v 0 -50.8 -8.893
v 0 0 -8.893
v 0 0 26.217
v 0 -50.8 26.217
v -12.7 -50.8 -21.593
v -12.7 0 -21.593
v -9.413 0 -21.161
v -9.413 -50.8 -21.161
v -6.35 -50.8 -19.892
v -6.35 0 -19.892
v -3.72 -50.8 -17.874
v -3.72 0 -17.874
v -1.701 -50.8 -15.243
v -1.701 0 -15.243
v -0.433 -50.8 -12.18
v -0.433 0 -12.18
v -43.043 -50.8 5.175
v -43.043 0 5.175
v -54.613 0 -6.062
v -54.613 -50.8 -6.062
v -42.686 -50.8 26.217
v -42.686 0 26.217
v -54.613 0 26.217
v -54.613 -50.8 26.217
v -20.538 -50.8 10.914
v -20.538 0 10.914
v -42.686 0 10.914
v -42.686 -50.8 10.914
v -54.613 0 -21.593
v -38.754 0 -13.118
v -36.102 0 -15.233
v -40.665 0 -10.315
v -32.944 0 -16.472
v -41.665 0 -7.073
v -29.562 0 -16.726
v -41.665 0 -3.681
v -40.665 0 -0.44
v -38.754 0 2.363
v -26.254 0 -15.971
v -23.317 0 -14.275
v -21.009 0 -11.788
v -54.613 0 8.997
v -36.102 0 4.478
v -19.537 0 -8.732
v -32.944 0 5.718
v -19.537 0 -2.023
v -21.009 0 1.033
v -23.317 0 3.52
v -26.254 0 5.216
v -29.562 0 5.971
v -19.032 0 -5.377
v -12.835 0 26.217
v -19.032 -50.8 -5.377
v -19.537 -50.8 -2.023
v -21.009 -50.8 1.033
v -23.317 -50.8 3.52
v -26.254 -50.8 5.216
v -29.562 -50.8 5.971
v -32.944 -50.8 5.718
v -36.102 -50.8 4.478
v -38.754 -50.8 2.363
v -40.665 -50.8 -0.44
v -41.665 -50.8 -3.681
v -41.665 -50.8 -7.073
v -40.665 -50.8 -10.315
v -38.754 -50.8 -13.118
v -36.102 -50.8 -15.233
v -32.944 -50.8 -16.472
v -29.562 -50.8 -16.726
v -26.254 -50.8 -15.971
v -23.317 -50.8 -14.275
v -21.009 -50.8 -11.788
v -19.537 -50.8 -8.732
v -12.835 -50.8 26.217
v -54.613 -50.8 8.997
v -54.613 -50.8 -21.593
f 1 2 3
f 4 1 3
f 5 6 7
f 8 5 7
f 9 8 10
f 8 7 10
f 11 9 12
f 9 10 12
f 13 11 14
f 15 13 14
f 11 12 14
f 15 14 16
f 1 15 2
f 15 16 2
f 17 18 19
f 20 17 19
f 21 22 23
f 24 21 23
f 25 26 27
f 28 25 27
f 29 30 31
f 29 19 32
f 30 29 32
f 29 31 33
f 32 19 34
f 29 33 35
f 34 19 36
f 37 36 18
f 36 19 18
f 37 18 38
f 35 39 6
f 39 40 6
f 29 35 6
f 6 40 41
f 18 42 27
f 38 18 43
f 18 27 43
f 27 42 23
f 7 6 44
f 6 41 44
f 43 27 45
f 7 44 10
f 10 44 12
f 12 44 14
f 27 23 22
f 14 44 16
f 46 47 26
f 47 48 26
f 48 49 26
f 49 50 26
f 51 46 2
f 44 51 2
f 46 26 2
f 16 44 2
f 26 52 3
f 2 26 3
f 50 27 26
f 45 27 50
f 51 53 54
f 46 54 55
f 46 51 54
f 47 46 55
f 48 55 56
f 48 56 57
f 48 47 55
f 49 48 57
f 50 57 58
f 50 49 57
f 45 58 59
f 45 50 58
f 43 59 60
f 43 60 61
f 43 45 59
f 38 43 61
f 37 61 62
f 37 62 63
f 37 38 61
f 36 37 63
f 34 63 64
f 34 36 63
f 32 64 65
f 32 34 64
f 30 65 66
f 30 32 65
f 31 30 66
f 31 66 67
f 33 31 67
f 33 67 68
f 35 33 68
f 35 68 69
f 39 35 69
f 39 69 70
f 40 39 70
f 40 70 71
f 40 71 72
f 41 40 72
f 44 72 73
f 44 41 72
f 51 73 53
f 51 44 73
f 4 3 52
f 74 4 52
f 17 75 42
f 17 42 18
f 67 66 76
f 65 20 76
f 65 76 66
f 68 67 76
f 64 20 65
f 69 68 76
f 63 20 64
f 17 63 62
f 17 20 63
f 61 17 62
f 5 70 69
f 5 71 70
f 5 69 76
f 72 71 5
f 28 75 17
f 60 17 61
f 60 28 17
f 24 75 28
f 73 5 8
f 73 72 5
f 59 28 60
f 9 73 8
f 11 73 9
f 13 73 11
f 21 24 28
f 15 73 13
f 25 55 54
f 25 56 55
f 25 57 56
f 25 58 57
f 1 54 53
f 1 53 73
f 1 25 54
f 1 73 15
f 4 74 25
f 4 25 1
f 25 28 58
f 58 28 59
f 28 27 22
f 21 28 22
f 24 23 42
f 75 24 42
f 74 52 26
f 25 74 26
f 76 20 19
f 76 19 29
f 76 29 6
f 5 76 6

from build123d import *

# Parameters (mm, degrees)
F0_R     = 11.380259
F1_DEPTH = 50.8


with BuildPart() as f1:
    # F0 (on Front) → F1 (new body)
    with BuildSketch(Plane.XZ):
        with BuildLine():
            Line((-42.685506, 26.217468), (-54.612678, 26.217468))
            Line((-54.612678, 26.217468), (-54.612678, 8.996693))
            Line((-54.612678, 8.996693), (-43.042839, 5.175187))
            Line((-43.042839, 5.175187), (-54.612678, -6.061751))
            Line((-54.612678, -6.061751), (-54.612678, -21.593322))
            Line((-54.612678, -21.593322), (-12.7, -21.593322))
            ThreePointArc((-12.7, -21.593322), (-3.719744, -17.873578), (0, -8.893322))
            Line((0, -8.893322), (0, 26.217468))
            Line((0, 26.217468), (-12.834665, 26.217468))
            Line((-12.834665, 26.217468), (-20.538239, 10.913563))
            Line((-20.538239, 10.913563), (-42.685506, 10.913563))
            Line((-42.685506, 10.913563), (-42.685506, 26.217468))
        make_face()
        with Locations((-30.412134, -5.377338)):
            Circle(F0_R, mode=Mode.SUBTRACT)
    extrude(amount=F1_DEPTH)


solid = f1.part
